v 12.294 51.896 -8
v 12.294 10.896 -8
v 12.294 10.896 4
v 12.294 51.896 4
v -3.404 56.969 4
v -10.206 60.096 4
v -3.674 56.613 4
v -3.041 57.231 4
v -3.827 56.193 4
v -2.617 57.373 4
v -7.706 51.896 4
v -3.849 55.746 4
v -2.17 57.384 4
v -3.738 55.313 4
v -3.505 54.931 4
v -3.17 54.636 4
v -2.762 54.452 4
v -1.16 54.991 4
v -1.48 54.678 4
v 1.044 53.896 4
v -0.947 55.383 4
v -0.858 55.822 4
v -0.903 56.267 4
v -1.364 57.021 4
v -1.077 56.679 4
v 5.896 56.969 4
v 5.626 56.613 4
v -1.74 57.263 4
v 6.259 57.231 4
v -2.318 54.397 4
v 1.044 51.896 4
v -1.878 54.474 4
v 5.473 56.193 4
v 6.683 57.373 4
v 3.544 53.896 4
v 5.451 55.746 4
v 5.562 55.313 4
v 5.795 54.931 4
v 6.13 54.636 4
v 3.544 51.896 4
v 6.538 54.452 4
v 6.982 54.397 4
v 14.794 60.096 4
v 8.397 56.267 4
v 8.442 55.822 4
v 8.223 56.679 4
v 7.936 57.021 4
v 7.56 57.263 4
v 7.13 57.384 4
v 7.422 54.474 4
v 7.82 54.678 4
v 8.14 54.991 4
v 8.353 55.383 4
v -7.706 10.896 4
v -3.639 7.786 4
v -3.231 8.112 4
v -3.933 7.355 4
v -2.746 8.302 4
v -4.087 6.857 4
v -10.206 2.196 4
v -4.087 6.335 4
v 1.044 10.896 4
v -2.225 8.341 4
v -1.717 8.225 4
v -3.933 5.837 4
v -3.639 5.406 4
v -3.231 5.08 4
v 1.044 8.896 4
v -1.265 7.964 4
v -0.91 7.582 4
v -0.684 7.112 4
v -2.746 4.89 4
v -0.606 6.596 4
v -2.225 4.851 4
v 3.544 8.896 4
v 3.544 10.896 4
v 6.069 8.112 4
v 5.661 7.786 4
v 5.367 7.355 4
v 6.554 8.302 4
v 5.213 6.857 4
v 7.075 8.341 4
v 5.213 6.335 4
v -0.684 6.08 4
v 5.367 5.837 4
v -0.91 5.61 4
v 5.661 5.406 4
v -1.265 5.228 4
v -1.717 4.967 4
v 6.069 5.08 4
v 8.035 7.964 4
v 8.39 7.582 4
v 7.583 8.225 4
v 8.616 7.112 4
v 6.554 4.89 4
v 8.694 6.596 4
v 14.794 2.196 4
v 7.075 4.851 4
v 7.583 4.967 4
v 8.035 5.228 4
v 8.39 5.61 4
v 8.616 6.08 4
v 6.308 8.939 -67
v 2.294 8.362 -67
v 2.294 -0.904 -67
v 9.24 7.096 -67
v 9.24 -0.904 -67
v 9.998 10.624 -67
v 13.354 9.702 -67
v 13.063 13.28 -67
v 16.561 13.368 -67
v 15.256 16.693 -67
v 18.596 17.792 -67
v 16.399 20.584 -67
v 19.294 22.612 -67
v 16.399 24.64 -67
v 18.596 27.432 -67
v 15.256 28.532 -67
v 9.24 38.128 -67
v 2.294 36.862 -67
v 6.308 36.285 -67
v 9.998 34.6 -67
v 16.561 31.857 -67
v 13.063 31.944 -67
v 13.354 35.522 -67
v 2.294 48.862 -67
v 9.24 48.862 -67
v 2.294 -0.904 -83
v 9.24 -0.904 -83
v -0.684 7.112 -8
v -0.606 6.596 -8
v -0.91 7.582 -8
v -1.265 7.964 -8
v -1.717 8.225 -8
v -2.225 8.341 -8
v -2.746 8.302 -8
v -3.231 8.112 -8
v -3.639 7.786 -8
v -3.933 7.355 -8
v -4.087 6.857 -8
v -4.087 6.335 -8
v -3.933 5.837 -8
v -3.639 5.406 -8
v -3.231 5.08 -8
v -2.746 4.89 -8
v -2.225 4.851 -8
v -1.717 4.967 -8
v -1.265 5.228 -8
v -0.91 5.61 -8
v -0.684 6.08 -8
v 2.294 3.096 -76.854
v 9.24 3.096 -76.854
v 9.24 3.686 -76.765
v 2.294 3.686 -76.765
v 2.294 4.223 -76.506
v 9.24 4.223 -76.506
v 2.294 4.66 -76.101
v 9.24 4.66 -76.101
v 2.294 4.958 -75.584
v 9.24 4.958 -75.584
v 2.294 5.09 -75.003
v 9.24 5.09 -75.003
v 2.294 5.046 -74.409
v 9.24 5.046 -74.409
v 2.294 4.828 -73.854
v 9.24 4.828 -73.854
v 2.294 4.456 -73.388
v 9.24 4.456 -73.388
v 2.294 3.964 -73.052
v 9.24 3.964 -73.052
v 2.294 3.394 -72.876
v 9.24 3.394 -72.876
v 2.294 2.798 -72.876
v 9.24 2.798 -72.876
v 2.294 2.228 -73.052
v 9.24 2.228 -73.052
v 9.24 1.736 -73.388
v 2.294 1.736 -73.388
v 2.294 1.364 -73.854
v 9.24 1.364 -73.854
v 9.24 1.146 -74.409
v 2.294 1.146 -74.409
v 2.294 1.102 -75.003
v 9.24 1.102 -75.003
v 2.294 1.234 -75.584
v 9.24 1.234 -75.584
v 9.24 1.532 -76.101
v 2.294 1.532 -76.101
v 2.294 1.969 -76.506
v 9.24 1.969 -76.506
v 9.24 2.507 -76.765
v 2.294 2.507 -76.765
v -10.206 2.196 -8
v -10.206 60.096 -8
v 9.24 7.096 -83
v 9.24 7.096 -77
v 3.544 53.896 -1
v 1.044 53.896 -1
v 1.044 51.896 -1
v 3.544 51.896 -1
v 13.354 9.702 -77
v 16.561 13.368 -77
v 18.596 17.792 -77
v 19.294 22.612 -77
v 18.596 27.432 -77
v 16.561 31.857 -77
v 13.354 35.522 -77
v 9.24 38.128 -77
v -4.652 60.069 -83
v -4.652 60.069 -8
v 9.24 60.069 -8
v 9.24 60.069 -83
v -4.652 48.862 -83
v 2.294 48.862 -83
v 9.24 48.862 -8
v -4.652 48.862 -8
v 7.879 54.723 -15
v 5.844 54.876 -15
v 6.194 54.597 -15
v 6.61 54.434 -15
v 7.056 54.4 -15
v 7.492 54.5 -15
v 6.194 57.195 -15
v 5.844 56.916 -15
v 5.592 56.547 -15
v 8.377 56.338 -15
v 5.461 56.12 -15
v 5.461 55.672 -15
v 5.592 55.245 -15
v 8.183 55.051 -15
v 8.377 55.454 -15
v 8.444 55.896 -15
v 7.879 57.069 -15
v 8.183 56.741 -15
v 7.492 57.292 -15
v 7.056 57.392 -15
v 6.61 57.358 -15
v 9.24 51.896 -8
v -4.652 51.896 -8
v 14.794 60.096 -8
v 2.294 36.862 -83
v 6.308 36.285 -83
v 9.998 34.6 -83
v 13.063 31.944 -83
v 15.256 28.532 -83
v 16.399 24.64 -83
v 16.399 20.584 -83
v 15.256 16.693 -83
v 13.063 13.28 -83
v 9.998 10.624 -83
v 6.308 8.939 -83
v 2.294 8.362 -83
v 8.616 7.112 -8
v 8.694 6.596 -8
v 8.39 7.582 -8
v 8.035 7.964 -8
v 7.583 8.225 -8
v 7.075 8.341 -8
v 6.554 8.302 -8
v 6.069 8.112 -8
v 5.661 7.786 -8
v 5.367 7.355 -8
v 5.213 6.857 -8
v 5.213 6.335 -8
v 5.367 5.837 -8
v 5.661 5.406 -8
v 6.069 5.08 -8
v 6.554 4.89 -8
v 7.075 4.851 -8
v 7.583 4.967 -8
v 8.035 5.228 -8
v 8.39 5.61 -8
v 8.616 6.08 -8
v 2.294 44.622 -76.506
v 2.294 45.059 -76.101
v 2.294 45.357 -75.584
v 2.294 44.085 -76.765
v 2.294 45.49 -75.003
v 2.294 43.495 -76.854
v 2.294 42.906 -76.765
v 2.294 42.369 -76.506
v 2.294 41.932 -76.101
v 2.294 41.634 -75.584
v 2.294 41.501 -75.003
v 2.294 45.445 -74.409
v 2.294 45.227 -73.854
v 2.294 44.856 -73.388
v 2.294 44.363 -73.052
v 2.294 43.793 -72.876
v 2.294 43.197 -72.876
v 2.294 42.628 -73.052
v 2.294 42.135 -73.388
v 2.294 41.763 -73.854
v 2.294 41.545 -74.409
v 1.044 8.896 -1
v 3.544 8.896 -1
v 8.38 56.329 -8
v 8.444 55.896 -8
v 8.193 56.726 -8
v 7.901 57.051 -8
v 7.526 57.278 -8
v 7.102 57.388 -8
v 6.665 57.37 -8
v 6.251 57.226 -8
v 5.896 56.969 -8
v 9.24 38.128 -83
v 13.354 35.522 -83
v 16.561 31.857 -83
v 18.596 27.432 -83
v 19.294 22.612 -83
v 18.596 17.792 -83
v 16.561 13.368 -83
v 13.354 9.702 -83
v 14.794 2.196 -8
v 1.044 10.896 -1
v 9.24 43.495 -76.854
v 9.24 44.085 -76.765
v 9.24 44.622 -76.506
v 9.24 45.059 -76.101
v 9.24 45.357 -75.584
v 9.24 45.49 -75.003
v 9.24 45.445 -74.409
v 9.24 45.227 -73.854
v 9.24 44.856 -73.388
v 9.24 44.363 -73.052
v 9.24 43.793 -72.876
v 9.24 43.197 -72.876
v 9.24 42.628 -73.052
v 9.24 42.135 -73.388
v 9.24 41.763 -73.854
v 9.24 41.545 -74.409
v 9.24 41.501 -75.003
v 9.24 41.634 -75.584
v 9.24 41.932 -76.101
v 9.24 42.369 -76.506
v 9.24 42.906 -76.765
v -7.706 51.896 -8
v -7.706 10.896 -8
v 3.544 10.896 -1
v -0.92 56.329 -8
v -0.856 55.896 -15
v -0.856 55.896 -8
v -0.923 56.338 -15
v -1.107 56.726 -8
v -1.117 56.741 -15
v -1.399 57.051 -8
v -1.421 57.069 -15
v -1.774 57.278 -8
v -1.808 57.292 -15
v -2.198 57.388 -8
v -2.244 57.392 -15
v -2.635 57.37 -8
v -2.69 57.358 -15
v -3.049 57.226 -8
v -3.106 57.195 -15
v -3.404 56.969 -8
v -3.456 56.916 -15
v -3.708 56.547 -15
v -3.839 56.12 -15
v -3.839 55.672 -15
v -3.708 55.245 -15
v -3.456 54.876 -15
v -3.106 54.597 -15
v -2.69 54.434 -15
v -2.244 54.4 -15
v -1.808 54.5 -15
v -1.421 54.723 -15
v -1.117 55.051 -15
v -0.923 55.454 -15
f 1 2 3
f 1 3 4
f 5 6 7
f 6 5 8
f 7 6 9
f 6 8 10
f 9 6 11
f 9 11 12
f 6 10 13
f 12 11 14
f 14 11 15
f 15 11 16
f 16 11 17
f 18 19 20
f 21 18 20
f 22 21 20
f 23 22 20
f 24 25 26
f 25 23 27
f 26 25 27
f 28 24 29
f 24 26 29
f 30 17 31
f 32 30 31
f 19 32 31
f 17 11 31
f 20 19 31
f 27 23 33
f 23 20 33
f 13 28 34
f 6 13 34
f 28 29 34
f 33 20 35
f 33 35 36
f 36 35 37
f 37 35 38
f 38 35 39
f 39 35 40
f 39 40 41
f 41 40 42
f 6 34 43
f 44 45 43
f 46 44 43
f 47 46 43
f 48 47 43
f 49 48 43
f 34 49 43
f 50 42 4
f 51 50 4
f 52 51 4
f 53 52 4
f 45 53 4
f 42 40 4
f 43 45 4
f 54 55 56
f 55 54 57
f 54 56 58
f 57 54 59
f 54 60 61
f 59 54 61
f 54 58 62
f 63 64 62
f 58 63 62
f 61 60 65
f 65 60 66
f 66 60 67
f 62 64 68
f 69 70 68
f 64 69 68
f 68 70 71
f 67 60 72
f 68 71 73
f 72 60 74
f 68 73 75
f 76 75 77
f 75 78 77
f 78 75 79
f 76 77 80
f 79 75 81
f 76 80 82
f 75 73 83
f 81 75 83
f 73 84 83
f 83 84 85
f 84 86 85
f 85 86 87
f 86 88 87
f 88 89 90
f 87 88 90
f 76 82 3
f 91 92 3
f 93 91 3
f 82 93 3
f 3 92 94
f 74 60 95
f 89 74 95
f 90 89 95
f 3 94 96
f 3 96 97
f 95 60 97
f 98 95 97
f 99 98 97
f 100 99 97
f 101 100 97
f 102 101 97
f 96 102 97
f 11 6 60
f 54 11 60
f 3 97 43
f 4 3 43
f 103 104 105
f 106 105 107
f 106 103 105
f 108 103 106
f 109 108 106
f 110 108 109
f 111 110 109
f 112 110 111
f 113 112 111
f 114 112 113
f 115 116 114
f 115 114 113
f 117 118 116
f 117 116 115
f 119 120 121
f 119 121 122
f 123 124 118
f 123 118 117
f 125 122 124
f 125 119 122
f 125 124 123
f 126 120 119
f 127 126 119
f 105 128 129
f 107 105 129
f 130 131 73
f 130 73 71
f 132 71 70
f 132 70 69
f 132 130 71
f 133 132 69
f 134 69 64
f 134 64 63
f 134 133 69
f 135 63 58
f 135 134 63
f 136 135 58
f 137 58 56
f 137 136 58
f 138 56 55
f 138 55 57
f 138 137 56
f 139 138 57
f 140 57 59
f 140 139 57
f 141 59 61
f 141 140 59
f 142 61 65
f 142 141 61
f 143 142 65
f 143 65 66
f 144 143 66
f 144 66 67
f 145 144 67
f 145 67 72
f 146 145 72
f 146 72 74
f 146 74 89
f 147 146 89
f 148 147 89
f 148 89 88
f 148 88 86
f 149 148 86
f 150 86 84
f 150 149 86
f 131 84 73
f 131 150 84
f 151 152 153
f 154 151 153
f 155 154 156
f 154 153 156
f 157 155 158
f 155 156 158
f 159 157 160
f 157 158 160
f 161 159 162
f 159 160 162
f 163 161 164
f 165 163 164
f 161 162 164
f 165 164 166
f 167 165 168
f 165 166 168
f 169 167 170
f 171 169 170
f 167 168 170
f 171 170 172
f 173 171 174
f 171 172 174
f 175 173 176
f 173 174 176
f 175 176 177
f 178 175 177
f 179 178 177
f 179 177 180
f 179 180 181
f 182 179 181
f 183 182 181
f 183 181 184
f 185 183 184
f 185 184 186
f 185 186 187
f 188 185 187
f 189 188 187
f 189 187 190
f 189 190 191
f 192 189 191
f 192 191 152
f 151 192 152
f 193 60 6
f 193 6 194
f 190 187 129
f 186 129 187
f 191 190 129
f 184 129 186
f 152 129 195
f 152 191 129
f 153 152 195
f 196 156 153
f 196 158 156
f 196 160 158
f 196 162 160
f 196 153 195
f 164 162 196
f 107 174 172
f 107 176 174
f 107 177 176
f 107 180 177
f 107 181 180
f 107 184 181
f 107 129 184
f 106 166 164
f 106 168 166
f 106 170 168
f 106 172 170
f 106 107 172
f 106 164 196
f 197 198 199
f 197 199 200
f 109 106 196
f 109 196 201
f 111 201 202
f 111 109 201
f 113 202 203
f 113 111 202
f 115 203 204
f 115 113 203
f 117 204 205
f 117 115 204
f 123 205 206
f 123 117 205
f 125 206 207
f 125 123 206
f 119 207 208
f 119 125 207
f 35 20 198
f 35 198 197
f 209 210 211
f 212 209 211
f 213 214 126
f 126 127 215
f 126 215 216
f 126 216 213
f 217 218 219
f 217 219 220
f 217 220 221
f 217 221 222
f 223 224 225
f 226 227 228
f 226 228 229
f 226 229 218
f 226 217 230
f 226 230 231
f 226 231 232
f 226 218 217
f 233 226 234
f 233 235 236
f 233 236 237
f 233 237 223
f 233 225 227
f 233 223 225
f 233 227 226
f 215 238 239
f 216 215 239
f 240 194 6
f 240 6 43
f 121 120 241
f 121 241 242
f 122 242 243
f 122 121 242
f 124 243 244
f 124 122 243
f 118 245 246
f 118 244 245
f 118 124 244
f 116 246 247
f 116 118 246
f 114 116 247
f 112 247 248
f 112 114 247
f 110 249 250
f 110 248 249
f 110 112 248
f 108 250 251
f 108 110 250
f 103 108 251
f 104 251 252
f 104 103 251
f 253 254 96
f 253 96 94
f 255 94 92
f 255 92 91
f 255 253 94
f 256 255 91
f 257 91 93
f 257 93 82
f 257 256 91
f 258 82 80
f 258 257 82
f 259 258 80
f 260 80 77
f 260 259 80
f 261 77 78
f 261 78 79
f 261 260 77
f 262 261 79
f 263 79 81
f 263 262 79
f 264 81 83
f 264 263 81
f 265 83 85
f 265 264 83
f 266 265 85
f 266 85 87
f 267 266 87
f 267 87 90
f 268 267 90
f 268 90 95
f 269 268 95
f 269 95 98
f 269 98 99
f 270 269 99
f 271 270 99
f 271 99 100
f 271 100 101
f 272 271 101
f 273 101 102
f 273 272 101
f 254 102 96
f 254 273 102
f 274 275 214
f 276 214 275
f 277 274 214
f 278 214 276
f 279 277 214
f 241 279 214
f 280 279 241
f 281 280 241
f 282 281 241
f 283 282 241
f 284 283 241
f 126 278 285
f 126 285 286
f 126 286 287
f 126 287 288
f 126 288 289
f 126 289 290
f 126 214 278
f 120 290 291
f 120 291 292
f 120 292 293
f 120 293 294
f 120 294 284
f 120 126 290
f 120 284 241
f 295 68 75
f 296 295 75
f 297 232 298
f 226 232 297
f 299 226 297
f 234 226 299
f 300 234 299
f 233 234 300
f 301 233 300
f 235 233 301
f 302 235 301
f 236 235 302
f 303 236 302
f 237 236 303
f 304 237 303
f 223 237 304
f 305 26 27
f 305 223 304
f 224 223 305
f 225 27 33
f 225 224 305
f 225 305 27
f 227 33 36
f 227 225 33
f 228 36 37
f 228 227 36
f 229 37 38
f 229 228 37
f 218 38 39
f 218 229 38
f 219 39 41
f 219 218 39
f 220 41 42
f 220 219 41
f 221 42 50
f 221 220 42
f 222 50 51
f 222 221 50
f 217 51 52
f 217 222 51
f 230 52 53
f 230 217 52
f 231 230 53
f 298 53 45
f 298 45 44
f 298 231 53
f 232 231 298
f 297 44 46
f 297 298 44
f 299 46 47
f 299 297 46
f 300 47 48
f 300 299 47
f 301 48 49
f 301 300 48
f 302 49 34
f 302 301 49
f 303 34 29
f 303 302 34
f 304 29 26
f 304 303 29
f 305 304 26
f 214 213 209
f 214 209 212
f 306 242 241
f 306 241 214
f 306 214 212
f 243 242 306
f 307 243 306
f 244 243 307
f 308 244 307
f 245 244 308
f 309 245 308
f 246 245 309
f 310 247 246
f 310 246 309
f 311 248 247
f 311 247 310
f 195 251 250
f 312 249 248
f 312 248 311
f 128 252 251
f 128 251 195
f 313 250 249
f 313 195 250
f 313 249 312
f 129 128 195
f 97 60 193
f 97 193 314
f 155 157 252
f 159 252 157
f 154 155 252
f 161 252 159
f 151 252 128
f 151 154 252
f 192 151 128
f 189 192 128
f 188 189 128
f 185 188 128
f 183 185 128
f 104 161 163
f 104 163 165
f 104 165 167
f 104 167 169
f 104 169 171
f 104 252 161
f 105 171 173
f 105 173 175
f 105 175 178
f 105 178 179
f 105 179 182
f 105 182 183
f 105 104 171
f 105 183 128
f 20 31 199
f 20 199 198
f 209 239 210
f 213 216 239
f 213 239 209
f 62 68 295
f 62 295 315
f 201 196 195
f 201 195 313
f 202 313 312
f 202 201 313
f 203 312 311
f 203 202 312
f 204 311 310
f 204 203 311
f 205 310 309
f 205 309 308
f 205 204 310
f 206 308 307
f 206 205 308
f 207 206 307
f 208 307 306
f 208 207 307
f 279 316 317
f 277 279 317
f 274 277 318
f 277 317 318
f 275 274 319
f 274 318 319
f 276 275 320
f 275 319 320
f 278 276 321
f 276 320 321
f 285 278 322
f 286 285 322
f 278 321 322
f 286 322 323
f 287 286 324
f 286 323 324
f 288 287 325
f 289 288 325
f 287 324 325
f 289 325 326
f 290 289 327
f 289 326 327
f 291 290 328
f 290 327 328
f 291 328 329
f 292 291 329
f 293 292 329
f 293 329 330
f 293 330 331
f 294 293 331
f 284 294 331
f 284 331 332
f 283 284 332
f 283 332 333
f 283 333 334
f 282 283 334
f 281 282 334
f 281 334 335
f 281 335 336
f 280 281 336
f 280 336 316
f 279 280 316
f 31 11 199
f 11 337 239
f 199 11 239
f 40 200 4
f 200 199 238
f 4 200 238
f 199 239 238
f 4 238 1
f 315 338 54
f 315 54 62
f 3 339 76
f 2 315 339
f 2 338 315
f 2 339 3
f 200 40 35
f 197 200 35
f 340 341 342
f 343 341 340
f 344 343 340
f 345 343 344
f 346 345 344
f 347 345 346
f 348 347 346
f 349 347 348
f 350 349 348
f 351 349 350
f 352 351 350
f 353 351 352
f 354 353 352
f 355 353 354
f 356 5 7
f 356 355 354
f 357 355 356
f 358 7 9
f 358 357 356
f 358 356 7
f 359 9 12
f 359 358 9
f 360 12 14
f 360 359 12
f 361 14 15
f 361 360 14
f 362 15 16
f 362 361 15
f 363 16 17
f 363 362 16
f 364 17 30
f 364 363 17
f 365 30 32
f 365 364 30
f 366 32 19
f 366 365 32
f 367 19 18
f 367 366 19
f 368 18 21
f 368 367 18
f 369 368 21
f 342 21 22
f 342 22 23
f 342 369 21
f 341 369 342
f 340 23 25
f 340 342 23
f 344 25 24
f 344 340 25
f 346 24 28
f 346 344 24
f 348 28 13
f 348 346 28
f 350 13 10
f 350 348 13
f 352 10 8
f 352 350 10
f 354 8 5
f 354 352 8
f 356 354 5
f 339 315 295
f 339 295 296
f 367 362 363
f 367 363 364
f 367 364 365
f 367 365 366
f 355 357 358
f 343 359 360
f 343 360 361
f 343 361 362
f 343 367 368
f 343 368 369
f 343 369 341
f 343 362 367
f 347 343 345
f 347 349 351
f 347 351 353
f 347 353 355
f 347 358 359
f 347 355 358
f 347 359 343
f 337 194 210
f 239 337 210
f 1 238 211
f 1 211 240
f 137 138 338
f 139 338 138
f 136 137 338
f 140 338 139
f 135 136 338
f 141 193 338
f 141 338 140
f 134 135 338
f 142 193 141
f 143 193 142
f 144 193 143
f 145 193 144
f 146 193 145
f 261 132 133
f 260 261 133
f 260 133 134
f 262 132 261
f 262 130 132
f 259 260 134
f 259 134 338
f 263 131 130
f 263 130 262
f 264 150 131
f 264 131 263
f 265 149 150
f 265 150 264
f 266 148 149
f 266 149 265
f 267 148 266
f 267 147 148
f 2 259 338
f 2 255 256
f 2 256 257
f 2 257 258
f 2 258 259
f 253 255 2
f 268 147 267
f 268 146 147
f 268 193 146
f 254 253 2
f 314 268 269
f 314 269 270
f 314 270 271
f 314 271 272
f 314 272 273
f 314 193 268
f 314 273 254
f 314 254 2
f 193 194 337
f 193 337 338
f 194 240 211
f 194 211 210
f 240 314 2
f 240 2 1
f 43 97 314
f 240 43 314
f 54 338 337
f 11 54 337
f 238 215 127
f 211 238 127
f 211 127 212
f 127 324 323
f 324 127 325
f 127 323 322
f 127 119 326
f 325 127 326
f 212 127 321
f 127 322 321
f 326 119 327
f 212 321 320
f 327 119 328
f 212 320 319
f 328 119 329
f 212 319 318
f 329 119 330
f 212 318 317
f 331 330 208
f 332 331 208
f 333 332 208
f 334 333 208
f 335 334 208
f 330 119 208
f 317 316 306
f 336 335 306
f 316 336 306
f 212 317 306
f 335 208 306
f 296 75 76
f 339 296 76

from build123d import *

# Parameters (mm, degrees)
SKETCH_14_W          = 13.892097438
SKETCH_14_H          = 8.107274344
EXTRUDE_7_DEPTH      = 75
EXTRUDE_15_DEPTH     = 12
SKETCH_21_R          = 17
SKETCH_21_R_2        = 14.25
EXTRUDE_16_DEPTH     = 6
EXTRUDE_17_DEPTH     = 6
CUT_EXTRUDE_3_DEPTH  = 6
EXTRUDE_START        = 10
EXTRUDE_18_DEPTH     = 10
SKETCH_26_R          = 2
CUT_EXTRUDE_5_DEPTH  = 102.624375612
SKETCH_27_W          = 25
SKETCH_27_H          = 59
SKETCH_27_R          = 1.75
SKETCH_27_R_2        = 1.5
SKETCH_27_W_2        = 20
SKETCH_27_H_2        = 41
EXTRUDE_20_DEPTH     = 12
SKETCH_29_W          = 25
SKETCH_29_H          = 12
EXTRUDE_21_DEPTH     = 2
SKETCH_31_W          = 13.892097438
SKETCH_31_H          = 75
EXTRUDE_22_DEPTH     = 3.1
SKETCH_33_W          = 25
SKETCH_33_H          = 12
CUT_EXTRUDE_8_DEPTH  = 3.1
CUT_EXTRUDE_START    = -7
SKETCH_34_R          = 1.5
CUT_EXTRUDE_9_DEPTH  = 7
SKETCH_35_W          = 2.5
SKETCH_35_H          = 2
CUT_EXTRUDE_10_DEPTH = 5


with BuildPart() as part:
    # 草圖14 → 填料-伸長7 (new body)
    with BuildSketch(Plane(origin=(0, 0, -8), x_dir=(-1, 0, 0), z_dir=(0, 0, -1))):
        with Locations((-2.293750102, 52.915857713)):
            Rectangle(SKETCH_14_W, SKETCH_14_H)
    extrude(amount=EXTRUDE_7_DEPTH)

    # 草圖15 → 填料-伸長15 (add)
    with BuildSketch(Plane.XZ.offset(-48.862220541)):
        Polygon((2.293750102, -83), (-4.652298617, -83), (-4.652298617, -77), (2.293750102, -77), (9.239798821, -77), (9.239798821, -83), align=None)
    extrude(amount=EXTRUDE_15_DEPTH)

    # 草圖21 → 填料-伸長16 (add)
    with BuildSketch(Plane.XY.offset(-77)):
        with Locations((2.293750102, 22.612220541)):
            Circle(SKETCH_21_R)
        with Locations((2.293750102, 22.612220541)):
            Circle(SKETCH_21_R_2, mode=Mode.SUBTRACT)
    extrude(amount=-EXTRUDE_16_DEPTH)

    # 草圖22 → 填料-伸長17 (add)
    with BuildSketch(Plane.XY.offset(-77)):
        with BuildLine():
            Line((-4.652298617, 7.096022321), (-4.652298617, -0.903977679))
            Line((-4.652298617, -0.903977679), (9.239798821, -0.903977679))
            Line((9.239798821, -0.903977679), (9.239798821, 7.096022321))
            ThreePointArc((9.239798821, 7.096022321), (2.293750102, 5.612220541), (-4.652298617, 7.096022321))
        make_face()
    extrude(amount=-EXTRUDE_17_DEPTH)

    # 草圖23 → 除料-伸長3 (cut)
    with BuildSketch(Plane.XY.offset(-77)):
        with BuildLine():
            Line((2.293750102, 48.862220541), (2.293750102, 36.862220541))
            ThreePointArc((2.293750102, 36.862220541), (-11.956249898, 22.612220541), (2.293750102, 8.362220541))
            Line((2.293750102, 8.362220541), (2.293750102, -0.903977679))
            Line((2.293750102, -0.903977679), (-4.652298617, -0.903977679))
            Line((-4.652298617, -0.903977679), (-4.652298617, 7.096022321))
            ThreePointArc((-4.652298617, 7.096022321), (-14.706249898, 22.612220541), (-4.652298617, 38.12841876))
            Line((-4.652298617, 38.12841876), (-4.652298617, 48.862220541))
            Line((-4.652298617, 48.862220541), (2.293750102, 48.862220541))
        make_face()
    extrude(amount=-CUT_EXTRUDE_3_DEPTH, mode=Mode.SUBTRACT)

    # 草圖25 → 填料-伸長18 (add)
    with BuildSketch(Plane.XY.offset(-77).offset(EXTRUDE_START)):
        with BuildLine():
            Line((2.293750102, -0.903977679), (9.239798821, -0.903977679))
            Line((9.239798821, -0.903977679), (9.239798821, 7.096022321))
            ThreePointArc((9.239798821, 7.096022321), (19.293750102, 22.612220541), (9.239798821, 38.12841876))
            Line((9.239798821, 38.12841876), (9.239798821, 48.862220541))
            Line((9.239798821, 48.862220541), (2.293750102, 48.862220541))
            Line((2.293750102, 48.862220541), (2.293750102, 36.862220541))
            ThreePointArc((2.293750102, 36.862220541), (16.543750102, 22.612220541), (2.293750102, 8.362220541))
            Line((2.293750102, 8.362220541), (2.293750102, -0.903977679))
        make_face()
    extrude(amount=-EXTRUDE_18_DEPTH)

    # 草圖26 → 除料-伸長5 (cut, through all)
    with BuildSketch(Plane(origin=(9.239798821, 0, 0), x_dir=(0, 0, -1), z_dir=(1, 0, 0))):
        with Locations((74.853766884, 3.096022321)):
            Circle(SKETCH_26_R)
        with Locations((74.853766884, 43.49531965)):
            Circle(SKETCH_26_R)
    extrude(amount=-CUT_EXTRUDE_5_DEPTH, mode=Mode.SUBTRACT)

    # 草圖27 → 填料-伸長20 (add)
    with BuildSketch(Plane.XY.offset(-8)):
        with Locations((2.293750102, 28.596022321)):
            Rectangle(SKETCH_27_W, SKETCH_27_H)
        with Locations((-2.356249898, 6.596022321)):
            Circle(SKETCH_27_R, mode=Mode.SUBTRACT)
        with Locations((6.943750102, 6.596022321)):
            Circle(SKETCH_27_R, mode=Mode.SUBTRACT)
        with Locations(Location((-2.356249898, 55.896022321, 0), (0, 0, 134.303638859))):
            Circle(SKETCH_27_R_2, mode=Mode.SUBTRACT)
        with Locations(Location((6.943750102, 55.896022321, 0), (0, 0, 134.303638859))):
            Circle(SKETCH_27_R_2, mode=Mode.SUBTRACT)
        with Locations((2.293750102, 31.396022321)):
            Rectangle(SKETCH_27_W_2, SKETCH_27_H_2, mode=Mode.SUBTRACT)
    extrude(amount=EXTRUDE_20_DEPTH)

    # 草圖29 → 填料-伸長21 (add)
    with BuildSketch(Plane(origin=(0, 58.096022321, 0), x_dir=(1, 0, 0), z_dir=(0, 1, 0))):
        with Locations((2.293750102, 2)):
            Rectangle(SKETCH_29_W, SKETCH_29_H)
    extrude(amount=EXTRUDE_21_DEPTH)

    # 草圖31 → 填料-伸長22 (add)
    with BuildSketch(Plane(origin=(0, 56.969494885, 0), x_dir=(1, 0, 0), z_dir=(0, 1, 0))):
        with Locations((2.293750102, 45.5)):
            Rectangle(SKETCH_31_W, SKETCH_31_H)
    extrude(amount=EXTRUDE_22_DEPTH)

    # 草圖33 → 除料-伸長8 (cut)
    with BuildSketch(Plane.XZ.offset(0.903977679)):
        with Locations((2.293750102, -2)):
            Rectangle(SKETCH_33_W, SKETCH_33_H)
    extrude(amount=-CUT_EXTRUDE_8_DEPTH, mode=Mode.SUBTRACT)

    # 草圖34 → 除料-伸長9 (cut)
    with BuildSketch(Plane.XY.offset(-8).offset(CUT_EXTRUDE_START)):
        with Locations((6.943750102, 55.896022321)):
            Circle(SKETCH_34_R)
        with Locations((-2.356249898, 55.896022321)):
            Circle(SKETCH_34_R)
    extrude(amount=CUT_EXTRUDE_9_DEPTH, mode=Mode.SUBTRACT)

    # 草圖35 → 除料-伸長10 (cut)
    with BuildSketch(Plane.XY.offset(4)):
        with Locations((2.293750102, 52.896022321)):
            Rectangle(SKETCH_35_W, SKETCH_35_H)
        with Locations((2.293750102, 9.896022321)):
            Rectangle(SKETCH_35_W, SKETCH_35_H)
    extrude(amount=-CUT_EXTRUDE_10_DEPTH, mode=Mode.SUBTRACT)


solid = part.part
